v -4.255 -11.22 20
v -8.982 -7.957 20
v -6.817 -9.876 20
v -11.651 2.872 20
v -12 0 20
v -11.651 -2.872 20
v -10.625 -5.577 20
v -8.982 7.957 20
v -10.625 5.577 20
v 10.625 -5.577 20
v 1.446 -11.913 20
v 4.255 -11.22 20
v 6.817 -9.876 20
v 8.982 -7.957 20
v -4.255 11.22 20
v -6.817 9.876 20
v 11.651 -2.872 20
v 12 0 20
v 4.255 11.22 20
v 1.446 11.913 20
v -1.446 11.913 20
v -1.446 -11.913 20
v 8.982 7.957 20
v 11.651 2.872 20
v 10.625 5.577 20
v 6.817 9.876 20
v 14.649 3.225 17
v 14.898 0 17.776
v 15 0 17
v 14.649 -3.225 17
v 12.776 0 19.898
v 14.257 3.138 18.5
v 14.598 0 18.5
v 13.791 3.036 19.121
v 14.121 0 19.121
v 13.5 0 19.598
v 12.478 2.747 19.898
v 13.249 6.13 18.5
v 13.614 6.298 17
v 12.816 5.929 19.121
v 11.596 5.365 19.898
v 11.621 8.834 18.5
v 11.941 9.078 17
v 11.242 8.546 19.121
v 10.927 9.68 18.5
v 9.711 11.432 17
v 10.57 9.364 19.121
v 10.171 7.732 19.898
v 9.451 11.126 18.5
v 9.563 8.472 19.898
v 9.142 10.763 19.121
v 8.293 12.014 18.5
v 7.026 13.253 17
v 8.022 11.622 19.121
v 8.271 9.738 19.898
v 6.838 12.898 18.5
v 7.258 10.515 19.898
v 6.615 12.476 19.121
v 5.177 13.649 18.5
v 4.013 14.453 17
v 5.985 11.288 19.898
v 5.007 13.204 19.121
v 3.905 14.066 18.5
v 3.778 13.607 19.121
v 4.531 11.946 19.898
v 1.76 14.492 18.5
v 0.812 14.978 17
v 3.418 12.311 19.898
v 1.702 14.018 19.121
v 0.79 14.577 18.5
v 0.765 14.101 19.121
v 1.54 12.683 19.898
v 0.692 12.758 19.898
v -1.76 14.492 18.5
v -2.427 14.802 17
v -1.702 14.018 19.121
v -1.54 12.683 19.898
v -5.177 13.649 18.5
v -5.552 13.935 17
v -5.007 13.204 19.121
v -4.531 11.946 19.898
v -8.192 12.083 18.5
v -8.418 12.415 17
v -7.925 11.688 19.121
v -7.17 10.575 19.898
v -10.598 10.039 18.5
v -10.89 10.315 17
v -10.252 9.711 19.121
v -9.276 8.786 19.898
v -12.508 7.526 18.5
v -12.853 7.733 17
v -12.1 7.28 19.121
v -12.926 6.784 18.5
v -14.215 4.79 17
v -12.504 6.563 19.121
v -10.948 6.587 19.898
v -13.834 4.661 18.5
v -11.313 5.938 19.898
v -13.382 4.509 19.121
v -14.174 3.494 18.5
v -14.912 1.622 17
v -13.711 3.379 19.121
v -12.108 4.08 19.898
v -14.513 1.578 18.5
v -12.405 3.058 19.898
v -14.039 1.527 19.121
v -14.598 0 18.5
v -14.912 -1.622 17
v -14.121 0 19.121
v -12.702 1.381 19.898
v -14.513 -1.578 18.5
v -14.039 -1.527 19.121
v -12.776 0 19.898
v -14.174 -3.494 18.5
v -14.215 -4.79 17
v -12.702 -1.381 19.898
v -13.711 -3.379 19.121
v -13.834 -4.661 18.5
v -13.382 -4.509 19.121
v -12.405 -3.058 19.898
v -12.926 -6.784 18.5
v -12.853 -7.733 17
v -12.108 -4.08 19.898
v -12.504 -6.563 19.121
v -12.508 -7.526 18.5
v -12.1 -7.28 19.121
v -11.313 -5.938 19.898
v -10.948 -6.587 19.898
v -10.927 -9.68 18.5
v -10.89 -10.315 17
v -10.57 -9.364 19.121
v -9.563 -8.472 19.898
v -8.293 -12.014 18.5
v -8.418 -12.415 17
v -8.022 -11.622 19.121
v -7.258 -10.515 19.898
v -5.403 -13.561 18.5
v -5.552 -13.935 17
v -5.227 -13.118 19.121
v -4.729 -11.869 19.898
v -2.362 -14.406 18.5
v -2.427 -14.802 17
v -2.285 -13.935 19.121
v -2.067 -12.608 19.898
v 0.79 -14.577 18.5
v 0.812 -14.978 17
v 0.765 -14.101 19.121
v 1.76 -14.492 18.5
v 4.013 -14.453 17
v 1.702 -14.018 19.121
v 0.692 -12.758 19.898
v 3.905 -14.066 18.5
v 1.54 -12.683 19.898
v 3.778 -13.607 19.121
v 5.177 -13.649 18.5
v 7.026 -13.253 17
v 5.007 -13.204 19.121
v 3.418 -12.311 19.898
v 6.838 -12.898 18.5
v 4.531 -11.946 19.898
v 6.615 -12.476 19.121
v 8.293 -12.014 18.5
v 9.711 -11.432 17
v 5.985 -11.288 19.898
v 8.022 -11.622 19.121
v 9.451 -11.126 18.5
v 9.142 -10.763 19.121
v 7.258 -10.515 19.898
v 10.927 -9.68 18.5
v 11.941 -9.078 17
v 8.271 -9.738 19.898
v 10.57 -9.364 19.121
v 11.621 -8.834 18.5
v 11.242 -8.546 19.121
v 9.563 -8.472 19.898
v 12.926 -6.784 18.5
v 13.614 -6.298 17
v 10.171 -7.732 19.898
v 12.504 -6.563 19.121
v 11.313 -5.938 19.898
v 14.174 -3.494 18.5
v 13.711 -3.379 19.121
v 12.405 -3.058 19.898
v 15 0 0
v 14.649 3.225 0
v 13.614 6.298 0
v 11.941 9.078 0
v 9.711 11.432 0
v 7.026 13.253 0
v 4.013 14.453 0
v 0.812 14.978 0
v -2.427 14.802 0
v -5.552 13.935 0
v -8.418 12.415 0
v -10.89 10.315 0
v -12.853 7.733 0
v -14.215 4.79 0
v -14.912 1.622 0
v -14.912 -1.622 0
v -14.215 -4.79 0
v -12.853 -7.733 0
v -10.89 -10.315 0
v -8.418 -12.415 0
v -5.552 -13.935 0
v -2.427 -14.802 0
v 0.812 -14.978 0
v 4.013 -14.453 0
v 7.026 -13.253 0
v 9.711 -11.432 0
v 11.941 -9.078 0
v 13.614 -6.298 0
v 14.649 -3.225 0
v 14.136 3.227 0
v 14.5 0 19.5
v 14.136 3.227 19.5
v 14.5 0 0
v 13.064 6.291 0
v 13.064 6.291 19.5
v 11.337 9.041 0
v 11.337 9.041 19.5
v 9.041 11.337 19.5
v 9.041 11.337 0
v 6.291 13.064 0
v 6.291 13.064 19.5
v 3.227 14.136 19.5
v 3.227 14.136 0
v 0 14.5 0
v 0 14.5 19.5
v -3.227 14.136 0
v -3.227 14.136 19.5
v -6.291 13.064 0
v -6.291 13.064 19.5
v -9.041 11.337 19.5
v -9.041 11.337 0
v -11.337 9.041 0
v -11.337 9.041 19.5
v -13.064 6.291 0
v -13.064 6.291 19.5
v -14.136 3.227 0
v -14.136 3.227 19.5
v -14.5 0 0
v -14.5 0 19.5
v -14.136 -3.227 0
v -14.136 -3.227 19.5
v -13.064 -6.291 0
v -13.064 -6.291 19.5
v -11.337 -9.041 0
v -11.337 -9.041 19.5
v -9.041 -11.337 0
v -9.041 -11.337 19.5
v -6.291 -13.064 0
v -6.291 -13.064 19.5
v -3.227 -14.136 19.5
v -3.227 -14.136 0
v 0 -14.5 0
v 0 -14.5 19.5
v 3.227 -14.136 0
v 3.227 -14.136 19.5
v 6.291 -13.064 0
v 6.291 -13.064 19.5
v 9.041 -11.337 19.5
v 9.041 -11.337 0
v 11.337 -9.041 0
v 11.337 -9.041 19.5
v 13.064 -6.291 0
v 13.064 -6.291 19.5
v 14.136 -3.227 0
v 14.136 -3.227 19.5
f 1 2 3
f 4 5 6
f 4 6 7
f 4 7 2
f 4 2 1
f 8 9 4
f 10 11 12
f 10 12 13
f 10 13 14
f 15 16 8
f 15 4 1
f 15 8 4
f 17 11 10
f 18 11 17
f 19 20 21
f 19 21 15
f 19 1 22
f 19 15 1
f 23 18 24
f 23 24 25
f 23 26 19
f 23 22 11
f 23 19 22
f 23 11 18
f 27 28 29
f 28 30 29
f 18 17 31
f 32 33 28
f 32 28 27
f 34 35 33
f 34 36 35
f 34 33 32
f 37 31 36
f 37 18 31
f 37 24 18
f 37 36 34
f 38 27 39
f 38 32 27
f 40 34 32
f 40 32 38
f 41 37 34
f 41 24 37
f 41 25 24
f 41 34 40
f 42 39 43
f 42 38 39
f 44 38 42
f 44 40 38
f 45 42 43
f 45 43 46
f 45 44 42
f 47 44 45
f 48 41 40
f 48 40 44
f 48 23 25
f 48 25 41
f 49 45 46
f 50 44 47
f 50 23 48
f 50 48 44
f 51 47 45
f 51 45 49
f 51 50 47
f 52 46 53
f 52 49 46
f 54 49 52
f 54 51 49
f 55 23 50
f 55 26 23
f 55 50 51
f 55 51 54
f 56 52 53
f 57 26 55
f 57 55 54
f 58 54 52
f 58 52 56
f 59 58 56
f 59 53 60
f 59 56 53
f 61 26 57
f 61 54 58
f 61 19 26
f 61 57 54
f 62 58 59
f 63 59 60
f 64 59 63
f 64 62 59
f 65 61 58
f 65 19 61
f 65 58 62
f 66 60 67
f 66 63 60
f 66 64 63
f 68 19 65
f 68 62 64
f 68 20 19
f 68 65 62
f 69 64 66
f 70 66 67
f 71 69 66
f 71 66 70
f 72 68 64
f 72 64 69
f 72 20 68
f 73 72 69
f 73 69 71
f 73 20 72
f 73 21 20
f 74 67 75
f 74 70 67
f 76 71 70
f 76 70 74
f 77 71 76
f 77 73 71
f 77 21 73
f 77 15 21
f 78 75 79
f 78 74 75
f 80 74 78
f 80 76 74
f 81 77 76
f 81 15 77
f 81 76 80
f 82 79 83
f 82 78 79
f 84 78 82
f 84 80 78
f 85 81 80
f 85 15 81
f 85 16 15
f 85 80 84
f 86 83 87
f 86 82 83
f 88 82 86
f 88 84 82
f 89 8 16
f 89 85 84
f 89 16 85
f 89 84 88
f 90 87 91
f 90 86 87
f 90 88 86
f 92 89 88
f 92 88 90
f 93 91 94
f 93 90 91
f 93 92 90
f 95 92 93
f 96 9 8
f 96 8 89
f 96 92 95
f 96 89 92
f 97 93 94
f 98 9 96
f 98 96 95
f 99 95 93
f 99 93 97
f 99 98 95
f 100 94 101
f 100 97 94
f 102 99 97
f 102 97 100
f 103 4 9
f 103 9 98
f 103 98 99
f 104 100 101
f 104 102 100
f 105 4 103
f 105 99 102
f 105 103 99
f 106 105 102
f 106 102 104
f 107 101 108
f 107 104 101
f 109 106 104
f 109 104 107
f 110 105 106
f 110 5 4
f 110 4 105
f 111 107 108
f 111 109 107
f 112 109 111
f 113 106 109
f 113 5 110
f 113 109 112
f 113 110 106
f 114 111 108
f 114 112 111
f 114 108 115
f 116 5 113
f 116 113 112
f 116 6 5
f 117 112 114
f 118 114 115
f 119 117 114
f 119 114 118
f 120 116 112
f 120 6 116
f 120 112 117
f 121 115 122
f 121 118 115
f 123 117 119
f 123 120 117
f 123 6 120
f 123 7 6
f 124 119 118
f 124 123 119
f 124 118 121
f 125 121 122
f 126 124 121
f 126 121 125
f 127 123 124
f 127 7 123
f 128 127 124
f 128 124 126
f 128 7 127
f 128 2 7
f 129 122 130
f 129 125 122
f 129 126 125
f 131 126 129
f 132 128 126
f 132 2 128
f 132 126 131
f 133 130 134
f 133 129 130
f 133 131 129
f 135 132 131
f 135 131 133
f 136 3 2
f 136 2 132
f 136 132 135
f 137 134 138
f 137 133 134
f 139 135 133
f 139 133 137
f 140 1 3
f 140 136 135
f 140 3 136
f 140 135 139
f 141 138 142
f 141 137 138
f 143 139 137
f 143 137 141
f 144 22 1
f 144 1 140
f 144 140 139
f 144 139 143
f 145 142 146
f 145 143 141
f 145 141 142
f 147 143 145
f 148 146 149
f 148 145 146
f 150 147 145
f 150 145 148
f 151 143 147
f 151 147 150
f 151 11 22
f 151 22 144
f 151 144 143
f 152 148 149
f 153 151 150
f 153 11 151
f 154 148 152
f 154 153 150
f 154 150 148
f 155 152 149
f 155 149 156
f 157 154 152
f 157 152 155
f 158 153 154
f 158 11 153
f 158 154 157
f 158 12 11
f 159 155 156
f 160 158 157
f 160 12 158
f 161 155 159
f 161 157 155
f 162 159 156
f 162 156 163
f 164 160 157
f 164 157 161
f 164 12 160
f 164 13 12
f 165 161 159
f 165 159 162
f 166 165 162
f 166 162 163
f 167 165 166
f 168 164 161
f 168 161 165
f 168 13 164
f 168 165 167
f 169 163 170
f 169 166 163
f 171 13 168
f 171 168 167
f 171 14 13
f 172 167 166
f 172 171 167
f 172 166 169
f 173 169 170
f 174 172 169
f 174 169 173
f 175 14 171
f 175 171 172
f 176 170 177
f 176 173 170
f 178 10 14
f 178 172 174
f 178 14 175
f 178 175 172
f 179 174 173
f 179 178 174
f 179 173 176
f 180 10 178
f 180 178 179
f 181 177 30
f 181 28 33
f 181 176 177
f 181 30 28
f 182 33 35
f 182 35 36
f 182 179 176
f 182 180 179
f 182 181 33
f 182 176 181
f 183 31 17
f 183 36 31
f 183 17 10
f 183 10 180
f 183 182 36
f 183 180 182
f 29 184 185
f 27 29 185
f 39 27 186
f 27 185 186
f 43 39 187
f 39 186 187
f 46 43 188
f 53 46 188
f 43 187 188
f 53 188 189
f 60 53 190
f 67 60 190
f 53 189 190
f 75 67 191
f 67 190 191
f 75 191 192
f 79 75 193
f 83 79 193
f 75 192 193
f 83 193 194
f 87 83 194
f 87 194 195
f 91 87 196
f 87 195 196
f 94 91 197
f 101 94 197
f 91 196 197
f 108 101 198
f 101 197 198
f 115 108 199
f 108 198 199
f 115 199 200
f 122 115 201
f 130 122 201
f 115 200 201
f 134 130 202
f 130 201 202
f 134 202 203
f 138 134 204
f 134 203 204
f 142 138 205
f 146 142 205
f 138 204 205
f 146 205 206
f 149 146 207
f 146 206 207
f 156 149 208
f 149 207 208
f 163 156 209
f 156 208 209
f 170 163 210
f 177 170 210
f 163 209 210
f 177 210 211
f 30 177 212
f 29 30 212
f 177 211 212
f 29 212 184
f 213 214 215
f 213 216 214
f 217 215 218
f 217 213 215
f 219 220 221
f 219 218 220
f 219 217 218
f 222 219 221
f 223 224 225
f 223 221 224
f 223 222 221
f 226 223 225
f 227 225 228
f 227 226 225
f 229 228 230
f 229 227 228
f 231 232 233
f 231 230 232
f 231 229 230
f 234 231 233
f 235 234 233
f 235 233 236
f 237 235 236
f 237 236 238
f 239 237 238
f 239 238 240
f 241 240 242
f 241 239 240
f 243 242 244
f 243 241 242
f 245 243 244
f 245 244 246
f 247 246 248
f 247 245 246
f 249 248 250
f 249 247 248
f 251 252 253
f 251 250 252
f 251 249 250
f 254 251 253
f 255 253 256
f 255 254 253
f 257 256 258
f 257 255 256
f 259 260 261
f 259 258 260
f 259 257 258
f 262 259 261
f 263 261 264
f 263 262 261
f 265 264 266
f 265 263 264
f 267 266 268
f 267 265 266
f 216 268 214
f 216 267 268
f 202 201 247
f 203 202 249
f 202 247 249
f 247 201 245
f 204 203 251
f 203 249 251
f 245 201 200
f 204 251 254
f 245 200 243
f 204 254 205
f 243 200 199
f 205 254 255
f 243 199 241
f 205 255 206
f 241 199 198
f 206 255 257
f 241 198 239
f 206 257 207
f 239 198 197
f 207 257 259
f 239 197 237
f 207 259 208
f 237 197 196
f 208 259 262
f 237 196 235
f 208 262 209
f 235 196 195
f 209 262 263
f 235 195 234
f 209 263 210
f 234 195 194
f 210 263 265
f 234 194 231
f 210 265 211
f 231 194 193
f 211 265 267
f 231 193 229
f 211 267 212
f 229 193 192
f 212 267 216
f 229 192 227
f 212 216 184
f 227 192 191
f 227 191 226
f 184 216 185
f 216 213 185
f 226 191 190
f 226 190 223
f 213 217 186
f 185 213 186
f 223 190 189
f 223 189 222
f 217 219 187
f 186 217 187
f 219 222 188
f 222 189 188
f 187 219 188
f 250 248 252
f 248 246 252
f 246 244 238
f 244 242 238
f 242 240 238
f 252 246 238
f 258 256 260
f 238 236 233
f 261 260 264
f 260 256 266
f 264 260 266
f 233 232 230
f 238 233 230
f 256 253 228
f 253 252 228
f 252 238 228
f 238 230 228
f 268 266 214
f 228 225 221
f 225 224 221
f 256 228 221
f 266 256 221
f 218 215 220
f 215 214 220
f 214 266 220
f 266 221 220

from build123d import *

# Parameters (mm, degrees)
SKETCH_1_R      = 15
EXTRUDE_1_DEPTH = 20
SHELL_1_T       = -0.5
FILLET_1_R      = 3


with BuildPart() as part:
    # 草图1 → 凸台-拉伸1 (new body)
    with BuildSketch(Plane.XY):
        Circle(SKETCH_1_R)
    extrude(amount=EXTRUDE_1_DEPTH)

    # 抽壳1
    shell_1_openings = [part.faces().sort_by_distance(p)[0] for p in [
        (0, 0, 0),
    ]]
    offset(amount=SHELL_1_T, openings=shell_1_openings, kind=Kind.INTERSECTION)

    # 圆角1
    fillet_1_edges = [part.edges().sort_by_distance(p)[0] for p in [
        (-15, 0, 20),
    ]]
    fillet(fillet_1_edges, radius=FILLET_1_R)


solid = part.part
